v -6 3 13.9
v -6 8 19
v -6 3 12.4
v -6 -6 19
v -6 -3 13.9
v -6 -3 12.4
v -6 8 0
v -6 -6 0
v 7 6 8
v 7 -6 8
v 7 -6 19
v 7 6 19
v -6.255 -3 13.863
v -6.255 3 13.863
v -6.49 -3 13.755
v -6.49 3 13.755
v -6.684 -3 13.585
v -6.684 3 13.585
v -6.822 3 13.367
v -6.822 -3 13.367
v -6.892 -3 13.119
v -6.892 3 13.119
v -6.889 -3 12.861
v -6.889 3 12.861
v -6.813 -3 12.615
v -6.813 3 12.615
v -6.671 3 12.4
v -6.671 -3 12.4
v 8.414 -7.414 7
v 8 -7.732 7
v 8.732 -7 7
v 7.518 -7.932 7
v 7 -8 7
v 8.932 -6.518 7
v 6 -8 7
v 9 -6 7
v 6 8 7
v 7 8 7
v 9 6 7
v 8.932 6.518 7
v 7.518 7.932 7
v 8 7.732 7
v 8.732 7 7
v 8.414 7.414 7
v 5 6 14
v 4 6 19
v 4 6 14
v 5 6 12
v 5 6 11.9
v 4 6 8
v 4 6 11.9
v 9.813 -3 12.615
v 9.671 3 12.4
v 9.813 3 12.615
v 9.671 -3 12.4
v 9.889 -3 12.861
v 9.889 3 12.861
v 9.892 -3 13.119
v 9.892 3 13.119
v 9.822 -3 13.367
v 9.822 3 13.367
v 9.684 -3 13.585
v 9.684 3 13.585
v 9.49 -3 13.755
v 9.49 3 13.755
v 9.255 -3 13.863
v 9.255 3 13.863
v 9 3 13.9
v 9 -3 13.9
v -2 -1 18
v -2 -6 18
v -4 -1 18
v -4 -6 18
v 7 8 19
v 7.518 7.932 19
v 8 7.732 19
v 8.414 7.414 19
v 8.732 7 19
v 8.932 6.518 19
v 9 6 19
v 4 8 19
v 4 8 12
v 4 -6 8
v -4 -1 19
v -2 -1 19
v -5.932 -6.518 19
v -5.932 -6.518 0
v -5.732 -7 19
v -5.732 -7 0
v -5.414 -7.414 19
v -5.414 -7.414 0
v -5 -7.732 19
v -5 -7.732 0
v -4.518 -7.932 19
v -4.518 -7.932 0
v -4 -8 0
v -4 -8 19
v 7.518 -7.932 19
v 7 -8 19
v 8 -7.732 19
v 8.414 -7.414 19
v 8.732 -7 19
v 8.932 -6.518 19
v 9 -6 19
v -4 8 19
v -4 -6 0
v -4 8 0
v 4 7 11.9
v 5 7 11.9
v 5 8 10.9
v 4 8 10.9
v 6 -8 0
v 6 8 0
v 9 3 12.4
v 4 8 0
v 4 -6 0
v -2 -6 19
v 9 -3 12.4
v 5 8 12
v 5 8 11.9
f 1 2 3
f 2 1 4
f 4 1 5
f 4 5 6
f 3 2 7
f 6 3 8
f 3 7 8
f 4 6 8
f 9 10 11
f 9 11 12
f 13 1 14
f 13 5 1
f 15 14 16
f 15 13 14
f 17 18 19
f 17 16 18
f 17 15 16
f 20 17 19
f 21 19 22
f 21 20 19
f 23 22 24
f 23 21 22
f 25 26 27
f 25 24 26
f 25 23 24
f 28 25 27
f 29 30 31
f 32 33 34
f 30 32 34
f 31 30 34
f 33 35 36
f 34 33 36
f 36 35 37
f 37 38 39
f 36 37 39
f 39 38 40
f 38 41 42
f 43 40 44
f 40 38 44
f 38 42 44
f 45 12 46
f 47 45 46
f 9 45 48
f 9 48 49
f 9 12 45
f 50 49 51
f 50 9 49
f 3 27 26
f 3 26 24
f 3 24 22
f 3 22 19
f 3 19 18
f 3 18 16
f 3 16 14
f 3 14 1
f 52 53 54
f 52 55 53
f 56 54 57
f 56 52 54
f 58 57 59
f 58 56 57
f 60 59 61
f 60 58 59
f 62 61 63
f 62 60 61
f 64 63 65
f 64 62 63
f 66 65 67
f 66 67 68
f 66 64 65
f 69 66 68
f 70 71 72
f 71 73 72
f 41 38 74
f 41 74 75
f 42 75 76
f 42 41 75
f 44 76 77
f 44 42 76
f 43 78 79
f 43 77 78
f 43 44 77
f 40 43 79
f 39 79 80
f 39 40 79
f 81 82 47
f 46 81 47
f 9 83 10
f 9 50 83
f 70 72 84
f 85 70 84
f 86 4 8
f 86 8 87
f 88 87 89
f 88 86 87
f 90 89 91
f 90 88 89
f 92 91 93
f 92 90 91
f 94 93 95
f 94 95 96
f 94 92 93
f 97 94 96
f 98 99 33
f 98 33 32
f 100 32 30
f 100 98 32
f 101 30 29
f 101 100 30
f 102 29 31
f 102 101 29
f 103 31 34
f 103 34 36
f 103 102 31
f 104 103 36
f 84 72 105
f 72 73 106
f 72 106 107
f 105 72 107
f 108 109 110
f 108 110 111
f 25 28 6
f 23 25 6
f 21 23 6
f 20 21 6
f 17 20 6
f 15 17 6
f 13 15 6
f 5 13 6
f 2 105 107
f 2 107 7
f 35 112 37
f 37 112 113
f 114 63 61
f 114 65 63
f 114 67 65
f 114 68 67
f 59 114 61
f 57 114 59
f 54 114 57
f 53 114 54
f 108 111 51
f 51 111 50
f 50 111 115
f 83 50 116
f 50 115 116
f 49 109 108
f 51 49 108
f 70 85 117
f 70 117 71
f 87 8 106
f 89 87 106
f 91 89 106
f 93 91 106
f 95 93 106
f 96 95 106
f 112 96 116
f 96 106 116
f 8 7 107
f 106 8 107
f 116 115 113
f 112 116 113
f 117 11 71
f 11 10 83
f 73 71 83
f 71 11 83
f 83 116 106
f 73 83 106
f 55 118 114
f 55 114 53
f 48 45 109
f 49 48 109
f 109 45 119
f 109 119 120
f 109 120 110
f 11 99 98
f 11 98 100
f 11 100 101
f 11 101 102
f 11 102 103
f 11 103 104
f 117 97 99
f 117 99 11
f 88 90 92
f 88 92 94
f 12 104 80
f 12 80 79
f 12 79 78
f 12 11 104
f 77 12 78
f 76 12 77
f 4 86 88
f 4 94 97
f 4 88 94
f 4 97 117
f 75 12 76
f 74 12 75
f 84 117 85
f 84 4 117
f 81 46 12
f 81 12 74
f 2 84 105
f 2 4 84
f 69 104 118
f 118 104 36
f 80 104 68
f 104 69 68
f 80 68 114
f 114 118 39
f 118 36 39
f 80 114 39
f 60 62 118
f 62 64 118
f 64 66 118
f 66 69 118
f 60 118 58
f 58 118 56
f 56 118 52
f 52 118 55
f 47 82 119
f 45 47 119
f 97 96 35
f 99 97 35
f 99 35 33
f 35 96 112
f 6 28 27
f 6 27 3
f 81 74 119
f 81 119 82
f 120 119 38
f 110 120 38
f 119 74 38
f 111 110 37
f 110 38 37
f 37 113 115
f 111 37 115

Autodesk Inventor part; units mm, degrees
ref_plane "YZ Plane" through (0, 0, 0) normal (1, 0, 0) x (0, 1, 0)
ref_plane "XZ Plane" through (0, 0, 0) normal (0, 1, 0) x (-1, 0, 0)
ref_plane "XY Plane" through (0, 0, 0) normal (0, 0, 1) x (1, 0, 0)
sketch "스케치1" plane through (0, 0, 0) normal (0, 0, 1) x (1, 0, 0)
  line L0 (-4, -6) -> (4, -6)
  line L1 (4, -6) -> (4, 6)
  line L2 (4, 6) -> (-4, 6)
  line L3 (-4, 6) -> (-4, -6)
  line L4 (-4, -6) -> (4, 6) construction
  line L5 (4, -6) -> (-4, 6) construction
  line L6 (-6, 8) -> (-6, -8)
  line L7 (-6, -8) -> (6, -8)
  line L8 (6, -8) -> (6, 8)
  line L9 (6, 8) -> (4, 8)
  line L10 (4, 8) -> (4, 6)
  line L11 (-6, 8) -> (-4, 8)
  line L12 (-4, 8) -> (-4, 6)
  point P0 (0, 0)
  dimension "d0" = 8
  dimension "d1" = 12
  dimension "d2" = 2
  dimension "t" = 2
  dimension "d4" = 2
  dimension "d5" = 2
extrude "돌출1" add sketch "스케치1" along normal blind 7 contours L0 L1 L10 L9 L8 L7 L6 L11 L12 L3
sketch "스케치2" plane through (0, 0, 7) normal (0, 0, 1) x (1, 0, 0)
  line L0 (4, 8) -> (4, -6) projected
  line L1 (4, -6) -> (-4, -6) projected
  line L2 (-4, -6) -> (-4, 8) projected
  line L3 (-4, 8) -> (-6, 8) projected
  line L4 (-6, 8) -> (-6, -8) projected
  line L5 (-6, -8) -> (6, -8) projected
  line L6 (6, 8) -> (4, 8) projected
  line L7 (6, 8) -> (9, 8)
  line L8 (9, 8) -> (9, -8)
  line L9 (9, -8) -> (6, -8)
  point P0 (0, 0)
  dimension "d8" = 3
extrude "돌출2" add sketch "스케치2" along normal blind 1
sketch "스케치3" plane through (0, 0, 8) normal (0, 0, 1) x (1, 0, 0)
  line L0 (-6, 8) -> (-6, -8) projected
  line L1 (-6, -8) -> (9, -8) projected
  line L2 (9, -8) -> (9, 8) projected
  line L3 (9, 8) -> (4, 8) projected
  line L4 (4, 8) -> (4, -6) projected
  line L5 (4, -6) -> (-4, -6) projected
  line L6 (-4, -6) -> (-4, 8) projected
  line L7 (-4, 8) -> (-6, 8) projected
  line L8 (4, -6) -> (-4, -6) projected
  line L9 (4, -6) -> (7, -6)
  line L10 (7, -6) -> (7, 6)
  line L11 (7, 6) -> (4, 6)
  line L12 (4, 8) -> (4, -6) projected
  point P0 (0, 0)
  point P1 (4, 6)
  dimension "d11" = 2
  dimension "d12" = 2
extrude "돌출3" add sketch "스케치3" along normal blind 11 contours L7 L6 L5 L9 L10 L11 L4 L3 L2 L1 L0
sketch "스케치4" plane through (-4, -6, 0) normal (1, 0, 0) x (0, 0, -1)
  line L0 (-19, 0) -> (-19, 14) projected
  line L1 (0, 0) -> (-19, 0) projected
  line L2 (-19, 0) -> (-18, 0)
  line L3 (-18, 0) -> (-18, 5)
  line L4 (-18, 5) -> (-19, 5)
  line L5 (-19, 5) -> (-19, 0)
  point P0 (0, 6)
  dimension "d15" = 1
  dimension "d16" = 5
extrude "돌출4" add sketch "스케치4" along normal blind 2
ref_plane "작업 평면1" through (-6, 0, 0) normal (0, 1, 0) x (1, 0, 0)
sketch "스케치5" plane through (-6, 0, 0) normal (0, 1, 0) x (1, 0, 0)
  line L0 (0, 0) -> (12, 0) projected
  line L1 (12, 0) -> (12, -7) projected
  line L2 (12, -7) -> (15, -7) projected
  line L3 (15, -7) -> (15, -19) projected
  line L4 (0, -19) -> (15, -19) projected
  line L5 (0, 0) -> (0, -19) projected
  line L6 (0, 0) -> (0, -19) projected
  circle A0 centre (0, -13) radius 0.9
  line L7 (-0.6708, -12.4) -> (0, -12.4)
  point P0 (6, 0)
  point P1 (0, -13.9)
  dimension "k" = 1.8
  dimension "d20" = 0.6
  dimension "d21" = 6
extrude "돌출5" add sketch "스케치5" along normal mid plane 6 contours L5 A0 L7 picked at (-0.0684, -13.3921)
ref_plane "작업 평면2" through (1.5, -8, 0) normal (-1, 0, 0) x (0, 0, 1)
mirror "미러1" about plane through (1.5, -8, 0) normal (-1, 0, 0) of "돌출5"
fillet "모깎기1" radius 2 3 edges at (9, 8, 13) (-6, -8, 9.5) (9, -8, 13)
sketch "스케치6" plane through (4, 8, 0) normal (0, 1, 0) x (1, 0, 0)
  line L0 (0, 0) -> (0, -19) projected
  line L1 (0, -12) -> (1, -12)
  line L2 (1, -12) -> (1, -11.9)
  line L3 (1, -11.9) -> (0, -11.9)
  line L4 (0, -11.9) -> (0, -12)
  line L5 (3, -19) -> (0, -19) projected
  point P0 (-4, 0)
  point P1 (0, -11.9)
  dimension "d25" = 1
  dimension "d26" = 0.1
  dimension "d29" = 7
extrude "돌출6" cut sketch "스케치6" against normal up to surface (2 mm away)
chamfer "모따기1" distance 2 angle 45 1 edges at (4.5, 6, 12)
chamfer "모따기2" distance 1 angle 45 1 edges at (4.5, 8, 11.9)
equation "\"d2\" = t"
equation "\"d4\" = t"
equation "\"d20\" = 0.333333 * k"
properties part number "_3D 인쇄"
